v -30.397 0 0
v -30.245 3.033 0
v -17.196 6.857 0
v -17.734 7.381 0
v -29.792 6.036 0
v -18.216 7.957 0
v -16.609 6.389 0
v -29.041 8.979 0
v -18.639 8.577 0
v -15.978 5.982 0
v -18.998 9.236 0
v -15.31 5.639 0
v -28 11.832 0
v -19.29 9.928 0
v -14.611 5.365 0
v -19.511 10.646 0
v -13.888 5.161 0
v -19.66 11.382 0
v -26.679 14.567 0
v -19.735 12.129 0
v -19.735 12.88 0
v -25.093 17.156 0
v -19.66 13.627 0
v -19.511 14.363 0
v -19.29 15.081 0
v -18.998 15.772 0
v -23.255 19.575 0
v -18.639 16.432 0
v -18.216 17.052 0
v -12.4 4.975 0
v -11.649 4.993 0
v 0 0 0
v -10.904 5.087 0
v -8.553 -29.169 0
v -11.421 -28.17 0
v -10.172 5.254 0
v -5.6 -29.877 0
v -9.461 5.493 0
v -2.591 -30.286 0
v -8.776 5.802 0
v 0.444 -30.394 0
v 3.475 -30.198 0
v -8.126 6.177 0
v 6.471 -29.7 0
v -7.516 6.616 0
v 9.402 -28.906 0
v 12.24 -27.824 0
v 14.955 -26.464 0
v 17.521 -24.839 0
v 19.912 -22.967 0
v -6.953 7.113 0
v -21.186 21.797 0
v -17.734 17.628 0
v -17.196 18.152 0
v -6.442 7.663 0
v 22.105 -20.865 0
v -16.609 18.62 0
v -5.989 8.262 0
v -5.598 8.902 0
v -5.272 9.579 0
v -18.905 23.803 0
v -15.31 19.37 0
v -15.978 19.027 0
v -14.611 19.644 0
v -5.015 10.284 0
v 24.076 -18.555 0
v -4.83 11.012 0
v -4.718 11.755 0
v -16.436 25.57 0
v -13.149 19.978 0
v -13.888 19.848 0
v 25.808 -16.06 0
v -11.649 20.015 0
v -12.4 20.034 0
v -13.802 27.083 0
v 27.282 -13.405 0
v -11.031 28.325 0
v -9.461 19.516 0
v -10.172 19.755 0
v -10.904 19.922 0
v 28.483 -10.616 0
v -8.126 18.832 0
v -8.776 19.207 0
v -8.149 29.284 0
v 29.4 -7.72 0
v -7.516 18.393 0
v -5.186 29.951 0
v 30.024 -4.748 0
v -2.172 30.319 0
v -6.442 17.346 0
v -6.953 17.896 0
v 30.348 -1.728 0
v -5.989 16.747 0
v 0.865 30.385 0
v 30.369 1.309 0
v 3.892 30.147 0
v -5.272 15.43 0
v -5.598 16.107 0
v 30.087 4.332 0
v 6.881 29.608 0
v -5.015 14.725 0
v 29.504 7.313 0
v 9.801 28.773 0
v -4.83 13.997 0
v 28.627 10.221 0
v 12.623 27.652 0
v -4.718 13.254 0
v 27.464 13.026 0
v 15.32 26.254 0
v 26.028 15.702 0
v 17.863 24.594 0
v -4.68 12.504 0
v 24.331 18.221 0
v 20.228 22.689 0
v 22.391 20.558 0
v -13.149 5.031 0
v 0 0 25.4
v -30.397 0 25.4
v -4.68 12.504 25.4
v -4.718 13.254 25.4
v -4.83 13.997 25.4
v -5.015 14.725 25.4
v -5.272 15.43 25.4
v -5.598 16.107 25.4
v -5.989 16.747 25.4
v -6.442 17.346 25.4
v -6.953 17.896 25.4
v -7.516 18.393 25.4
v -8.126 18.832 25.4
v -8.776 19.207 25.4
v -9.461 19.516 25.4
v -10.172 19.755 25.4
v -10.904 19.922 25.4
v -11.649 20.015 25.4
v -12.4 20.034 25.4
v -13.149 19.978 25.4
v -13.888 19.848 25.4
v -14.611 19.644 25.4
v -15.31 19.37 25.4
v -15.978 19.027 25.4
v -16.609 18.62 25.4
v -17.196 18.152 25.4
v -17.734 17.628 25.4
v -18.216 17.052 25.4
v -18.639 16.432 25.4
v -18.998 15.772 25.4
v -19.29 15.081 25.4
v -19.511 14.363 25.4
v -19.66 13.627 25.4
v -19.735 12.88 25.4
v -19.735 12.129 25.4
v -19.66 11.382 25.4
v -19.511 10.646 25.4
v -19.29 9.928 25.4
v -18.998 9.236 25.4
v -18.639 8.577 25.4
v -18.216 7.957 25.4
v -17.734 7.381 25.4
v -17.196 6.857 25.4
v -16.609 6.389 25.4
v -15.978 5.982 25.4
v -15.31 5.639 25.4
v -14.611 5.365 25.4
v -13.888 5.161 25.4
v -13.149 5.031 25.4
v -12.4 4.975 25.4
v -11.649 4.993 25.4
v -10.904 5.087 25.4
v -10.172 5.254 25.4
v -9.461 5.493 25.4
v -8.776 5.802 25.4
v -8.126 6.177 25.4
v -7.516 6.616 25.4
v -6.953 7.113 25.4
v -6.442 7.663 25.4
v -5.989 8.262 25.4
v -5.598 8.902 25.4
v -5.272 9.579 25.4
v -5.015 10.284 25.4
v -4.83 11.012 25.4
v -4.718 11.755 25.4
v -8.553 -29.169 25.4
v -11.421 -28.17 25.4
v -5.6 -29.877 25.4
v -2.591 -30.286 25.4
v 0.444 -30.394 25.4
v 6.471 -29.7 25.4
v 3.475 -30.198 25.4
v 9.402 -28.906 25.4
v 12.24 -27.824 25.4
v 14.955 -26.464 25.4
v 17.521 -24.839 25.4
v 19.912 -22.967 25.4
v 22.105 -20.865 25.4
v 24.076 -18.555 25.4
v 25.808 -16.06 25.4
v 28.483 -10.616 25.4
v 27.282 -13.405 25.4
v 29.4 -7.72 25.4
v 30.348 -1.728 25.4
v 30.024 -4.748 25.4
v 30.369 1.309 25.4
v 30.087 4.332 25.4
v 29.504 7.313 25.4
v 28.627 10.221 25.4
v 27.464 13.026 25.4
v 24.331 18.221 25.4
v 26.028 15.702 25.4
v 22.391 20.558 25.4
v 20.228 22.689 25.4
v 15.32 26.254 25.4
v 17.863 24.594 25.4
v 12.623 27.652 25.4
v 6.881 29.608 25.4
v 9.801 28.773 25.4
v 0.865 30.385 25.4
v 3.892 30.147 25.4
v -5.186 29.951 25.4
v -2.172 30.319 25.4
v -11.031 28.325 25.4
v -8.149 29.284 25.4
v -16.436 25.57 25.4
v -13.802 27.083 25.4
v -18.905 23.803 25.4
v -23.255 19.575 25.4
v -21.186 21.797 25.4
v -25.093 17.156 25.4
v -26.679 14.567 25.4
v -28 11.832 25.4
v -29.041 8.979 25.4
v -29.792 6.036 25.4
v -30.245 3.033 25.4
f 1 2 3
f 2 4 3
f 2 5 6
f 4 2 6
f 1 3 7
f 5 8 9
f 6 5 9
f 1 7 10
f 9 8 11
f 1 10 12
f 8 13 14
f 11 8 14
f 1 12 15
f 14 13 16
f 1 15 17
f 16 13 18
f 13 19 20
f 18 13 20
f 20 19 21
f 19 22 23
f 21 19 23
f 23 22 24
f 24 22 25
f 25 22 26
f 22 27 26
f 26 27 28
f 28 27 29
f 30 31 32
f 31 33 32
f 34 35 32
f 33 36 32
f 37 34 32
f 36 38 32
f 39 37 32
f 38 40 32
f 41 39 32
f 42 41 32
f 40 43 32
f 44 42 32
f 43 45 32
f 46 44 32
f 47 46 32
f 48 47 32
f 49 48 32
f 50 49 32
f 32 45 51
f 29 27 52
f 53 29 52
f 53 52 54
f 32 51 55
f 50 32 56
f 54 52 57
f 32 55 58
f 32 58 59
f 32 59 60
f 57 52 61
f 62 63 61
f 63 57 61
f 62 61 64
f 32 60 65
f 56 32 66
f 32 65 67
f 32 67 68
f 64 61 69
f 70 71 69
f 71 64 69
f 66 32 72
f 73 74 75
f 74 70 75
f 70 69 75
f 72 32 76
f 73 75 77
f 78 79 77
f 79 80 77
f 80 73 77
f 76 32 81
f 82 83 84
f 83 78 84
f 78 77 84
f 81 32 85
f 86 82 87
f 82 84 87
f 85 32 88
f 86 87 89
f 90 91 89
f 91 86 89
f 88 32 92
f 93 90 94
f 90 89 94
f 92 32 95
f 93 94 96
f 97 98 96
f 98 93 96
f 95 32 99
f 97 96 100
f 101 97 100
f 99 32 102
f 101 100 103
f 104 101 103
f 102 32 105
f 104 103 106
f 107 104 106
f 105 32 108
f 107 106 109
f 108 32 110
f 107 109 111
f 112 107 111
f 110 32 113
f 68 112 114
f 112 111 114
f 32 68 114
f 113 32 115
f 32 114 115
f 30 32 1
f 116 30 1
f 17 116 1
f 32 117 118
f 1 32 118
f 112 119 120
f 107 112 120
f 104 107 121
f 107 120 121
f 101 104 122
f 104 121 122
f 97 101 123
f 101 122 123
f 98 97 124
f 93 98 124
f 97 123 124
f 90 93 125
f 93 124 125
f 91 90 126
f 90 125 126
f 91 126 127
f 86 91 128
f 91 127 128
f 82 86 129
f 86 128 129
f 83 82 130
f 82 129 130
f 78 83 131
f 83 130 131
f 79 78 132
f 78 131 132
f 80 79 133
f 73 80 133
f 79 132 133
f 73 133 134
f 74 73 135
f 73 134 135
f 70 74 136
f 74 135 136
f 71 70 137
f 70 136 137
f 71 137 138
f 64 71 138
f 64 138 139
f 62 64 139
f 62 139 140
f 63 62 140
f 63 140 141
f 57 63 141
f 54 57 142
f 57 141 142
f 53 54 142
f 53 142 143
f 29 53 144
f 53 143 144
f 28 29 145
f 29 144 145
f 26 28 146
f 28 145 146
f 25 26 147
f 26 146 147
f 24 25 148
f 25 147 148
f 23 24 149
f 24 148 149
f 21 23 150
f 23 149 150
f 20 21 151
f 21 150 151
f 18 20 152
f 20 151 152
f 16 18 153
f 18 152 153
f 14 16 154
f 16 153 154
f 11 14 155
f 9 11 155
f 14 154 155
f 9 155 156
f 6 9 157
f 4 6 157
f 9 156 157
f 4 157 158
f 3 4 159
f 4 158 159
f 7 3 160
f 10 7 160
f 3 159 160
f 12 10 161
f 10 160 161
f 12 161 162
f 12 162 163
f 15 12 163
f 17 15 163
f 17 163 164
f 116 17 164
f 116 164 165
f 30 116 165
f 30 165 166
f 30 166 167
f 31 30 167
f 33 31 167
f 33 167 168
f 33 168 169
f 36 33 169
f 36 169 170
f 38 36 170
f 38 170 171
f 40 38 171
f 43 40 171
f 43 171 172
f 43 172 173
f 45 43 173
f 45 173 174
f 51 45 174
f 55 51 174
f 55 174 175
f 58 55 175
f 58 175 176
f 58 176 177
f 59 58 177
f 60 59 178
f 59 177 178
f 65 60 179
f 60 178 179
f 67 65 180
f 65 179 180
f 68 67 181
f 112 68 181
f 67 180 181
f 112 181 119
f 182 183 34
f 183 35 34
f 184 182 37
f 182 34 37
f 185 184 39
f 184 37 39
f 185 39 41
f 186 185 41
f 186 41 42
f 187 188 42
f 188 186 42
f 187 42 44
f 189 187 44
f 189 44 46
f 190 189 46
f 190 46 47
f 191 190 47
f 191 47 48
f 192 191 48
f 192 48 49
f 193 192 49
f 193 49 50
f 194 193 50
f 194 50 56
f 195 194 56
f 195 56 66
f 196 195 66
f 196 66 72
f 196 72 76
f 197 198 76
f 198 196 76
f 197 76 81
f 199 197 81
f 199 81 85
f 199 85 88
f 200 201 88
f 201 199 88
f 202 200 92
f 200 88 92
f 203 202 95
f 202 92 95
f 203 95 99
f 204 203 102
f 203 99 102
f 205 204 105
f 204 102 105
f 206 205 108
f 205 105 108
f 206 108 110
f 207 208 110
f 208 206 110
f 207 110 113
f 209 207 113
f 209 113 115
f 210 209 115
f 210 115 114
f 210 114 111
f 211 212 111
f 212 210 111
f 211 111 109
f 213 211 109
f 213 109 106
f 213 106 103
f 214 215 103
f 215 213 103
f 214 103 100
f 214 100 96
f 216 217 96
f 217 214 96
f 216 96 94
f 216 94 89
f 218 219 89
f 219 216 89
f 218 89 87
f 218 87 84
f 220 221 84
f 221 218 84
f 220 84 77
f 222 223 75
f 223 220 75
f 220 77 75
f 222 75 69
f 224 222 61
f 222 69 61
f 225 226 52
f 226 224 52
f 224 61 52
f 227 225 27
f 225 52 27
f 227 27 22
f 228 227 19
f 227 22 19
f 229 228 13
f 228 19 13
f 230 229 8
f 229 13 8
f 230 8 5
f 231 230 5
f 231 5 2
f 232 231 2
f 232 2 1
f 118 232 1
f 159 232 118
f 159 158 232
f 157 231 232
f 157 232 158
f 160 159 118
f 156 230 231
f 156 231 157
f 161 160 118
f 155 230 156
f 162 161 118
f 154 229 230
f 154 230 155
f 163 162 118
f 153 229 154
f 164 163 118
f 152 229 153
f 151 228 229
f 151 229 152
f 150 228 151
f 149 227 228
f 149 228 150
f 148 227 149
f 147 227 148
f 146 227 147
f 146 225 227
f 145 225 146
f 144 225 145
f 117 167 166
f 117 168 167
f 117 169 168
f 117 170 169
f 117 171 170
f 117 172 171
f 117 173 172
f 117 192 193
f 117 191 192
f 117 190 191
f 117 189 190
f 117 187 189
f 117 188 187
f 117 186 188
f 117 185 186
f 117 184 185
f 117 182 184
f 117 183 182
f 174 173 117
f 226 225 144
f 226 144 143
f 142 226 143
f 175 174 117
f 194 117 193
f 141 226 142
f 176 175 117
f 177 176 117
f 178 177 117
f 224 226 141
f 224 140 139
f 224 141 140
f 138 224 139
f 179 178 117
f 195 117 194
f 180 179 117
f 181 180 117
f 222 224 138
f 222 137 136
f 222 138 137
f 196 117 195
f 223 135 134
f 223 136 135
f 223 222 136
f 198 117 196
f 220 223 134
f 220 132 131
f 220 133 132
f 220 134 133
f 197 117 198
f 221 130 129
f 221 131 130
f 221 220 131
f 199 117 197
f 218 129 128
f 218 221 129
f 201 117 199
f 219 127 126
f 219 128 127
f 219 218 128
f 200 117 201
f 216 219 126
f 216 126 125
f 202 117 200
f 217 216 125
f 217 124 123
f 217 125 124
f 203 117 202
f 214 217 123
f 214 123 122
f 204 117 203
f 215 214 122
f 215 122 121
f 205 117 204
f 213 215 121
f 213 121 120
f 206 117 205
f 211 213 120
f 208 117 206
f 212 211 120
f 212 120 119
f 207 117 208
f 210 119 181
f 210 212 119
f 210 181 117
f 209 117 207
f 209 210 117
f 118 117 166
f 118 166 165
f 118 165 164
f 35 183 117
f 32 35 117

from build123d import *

# Parameters (mm, degrees)
F0_R     = 30.3969812701
F1_DEPTH = 25.4
F3_DEPTH = 25.4
F4_R     = 7.532023706
F5_DEPTH = 25.4


# Not quite as in the source:
# - a feature names something its author has since deleted; it is built from what else it names


with BuildPart() as f1:
    # F0 (on Top) → F1 (new body)
    with BuildSketch(Plane.XY):
        Circle(F0_R)
    extrude(amount=F1_DEPTH)

    # F2 (on face) → F3 (cut)
    with BuildSketch(Plane.XY.offset(25.4)):
        Polygon((0, 0), (-30.3969812701, 0), (-30.3969812701, -28.1696463504), (-11.4213613388, -28.1696463504), align=None)
    extrude(amount=-F3_DEPTH, mode=Mode.SUBTRACT)

    # F4 (on face) → F5 (cut)
    with BuildSketch(Plane.XY.offset(25.4)):
        with Locations((-12.2123174369, 12.5044481829)):
            Circle(F4_R)
    extrude(amount=-F5_DEPTH, mode=Mode.SUBTRACT)


solid = f1.part
